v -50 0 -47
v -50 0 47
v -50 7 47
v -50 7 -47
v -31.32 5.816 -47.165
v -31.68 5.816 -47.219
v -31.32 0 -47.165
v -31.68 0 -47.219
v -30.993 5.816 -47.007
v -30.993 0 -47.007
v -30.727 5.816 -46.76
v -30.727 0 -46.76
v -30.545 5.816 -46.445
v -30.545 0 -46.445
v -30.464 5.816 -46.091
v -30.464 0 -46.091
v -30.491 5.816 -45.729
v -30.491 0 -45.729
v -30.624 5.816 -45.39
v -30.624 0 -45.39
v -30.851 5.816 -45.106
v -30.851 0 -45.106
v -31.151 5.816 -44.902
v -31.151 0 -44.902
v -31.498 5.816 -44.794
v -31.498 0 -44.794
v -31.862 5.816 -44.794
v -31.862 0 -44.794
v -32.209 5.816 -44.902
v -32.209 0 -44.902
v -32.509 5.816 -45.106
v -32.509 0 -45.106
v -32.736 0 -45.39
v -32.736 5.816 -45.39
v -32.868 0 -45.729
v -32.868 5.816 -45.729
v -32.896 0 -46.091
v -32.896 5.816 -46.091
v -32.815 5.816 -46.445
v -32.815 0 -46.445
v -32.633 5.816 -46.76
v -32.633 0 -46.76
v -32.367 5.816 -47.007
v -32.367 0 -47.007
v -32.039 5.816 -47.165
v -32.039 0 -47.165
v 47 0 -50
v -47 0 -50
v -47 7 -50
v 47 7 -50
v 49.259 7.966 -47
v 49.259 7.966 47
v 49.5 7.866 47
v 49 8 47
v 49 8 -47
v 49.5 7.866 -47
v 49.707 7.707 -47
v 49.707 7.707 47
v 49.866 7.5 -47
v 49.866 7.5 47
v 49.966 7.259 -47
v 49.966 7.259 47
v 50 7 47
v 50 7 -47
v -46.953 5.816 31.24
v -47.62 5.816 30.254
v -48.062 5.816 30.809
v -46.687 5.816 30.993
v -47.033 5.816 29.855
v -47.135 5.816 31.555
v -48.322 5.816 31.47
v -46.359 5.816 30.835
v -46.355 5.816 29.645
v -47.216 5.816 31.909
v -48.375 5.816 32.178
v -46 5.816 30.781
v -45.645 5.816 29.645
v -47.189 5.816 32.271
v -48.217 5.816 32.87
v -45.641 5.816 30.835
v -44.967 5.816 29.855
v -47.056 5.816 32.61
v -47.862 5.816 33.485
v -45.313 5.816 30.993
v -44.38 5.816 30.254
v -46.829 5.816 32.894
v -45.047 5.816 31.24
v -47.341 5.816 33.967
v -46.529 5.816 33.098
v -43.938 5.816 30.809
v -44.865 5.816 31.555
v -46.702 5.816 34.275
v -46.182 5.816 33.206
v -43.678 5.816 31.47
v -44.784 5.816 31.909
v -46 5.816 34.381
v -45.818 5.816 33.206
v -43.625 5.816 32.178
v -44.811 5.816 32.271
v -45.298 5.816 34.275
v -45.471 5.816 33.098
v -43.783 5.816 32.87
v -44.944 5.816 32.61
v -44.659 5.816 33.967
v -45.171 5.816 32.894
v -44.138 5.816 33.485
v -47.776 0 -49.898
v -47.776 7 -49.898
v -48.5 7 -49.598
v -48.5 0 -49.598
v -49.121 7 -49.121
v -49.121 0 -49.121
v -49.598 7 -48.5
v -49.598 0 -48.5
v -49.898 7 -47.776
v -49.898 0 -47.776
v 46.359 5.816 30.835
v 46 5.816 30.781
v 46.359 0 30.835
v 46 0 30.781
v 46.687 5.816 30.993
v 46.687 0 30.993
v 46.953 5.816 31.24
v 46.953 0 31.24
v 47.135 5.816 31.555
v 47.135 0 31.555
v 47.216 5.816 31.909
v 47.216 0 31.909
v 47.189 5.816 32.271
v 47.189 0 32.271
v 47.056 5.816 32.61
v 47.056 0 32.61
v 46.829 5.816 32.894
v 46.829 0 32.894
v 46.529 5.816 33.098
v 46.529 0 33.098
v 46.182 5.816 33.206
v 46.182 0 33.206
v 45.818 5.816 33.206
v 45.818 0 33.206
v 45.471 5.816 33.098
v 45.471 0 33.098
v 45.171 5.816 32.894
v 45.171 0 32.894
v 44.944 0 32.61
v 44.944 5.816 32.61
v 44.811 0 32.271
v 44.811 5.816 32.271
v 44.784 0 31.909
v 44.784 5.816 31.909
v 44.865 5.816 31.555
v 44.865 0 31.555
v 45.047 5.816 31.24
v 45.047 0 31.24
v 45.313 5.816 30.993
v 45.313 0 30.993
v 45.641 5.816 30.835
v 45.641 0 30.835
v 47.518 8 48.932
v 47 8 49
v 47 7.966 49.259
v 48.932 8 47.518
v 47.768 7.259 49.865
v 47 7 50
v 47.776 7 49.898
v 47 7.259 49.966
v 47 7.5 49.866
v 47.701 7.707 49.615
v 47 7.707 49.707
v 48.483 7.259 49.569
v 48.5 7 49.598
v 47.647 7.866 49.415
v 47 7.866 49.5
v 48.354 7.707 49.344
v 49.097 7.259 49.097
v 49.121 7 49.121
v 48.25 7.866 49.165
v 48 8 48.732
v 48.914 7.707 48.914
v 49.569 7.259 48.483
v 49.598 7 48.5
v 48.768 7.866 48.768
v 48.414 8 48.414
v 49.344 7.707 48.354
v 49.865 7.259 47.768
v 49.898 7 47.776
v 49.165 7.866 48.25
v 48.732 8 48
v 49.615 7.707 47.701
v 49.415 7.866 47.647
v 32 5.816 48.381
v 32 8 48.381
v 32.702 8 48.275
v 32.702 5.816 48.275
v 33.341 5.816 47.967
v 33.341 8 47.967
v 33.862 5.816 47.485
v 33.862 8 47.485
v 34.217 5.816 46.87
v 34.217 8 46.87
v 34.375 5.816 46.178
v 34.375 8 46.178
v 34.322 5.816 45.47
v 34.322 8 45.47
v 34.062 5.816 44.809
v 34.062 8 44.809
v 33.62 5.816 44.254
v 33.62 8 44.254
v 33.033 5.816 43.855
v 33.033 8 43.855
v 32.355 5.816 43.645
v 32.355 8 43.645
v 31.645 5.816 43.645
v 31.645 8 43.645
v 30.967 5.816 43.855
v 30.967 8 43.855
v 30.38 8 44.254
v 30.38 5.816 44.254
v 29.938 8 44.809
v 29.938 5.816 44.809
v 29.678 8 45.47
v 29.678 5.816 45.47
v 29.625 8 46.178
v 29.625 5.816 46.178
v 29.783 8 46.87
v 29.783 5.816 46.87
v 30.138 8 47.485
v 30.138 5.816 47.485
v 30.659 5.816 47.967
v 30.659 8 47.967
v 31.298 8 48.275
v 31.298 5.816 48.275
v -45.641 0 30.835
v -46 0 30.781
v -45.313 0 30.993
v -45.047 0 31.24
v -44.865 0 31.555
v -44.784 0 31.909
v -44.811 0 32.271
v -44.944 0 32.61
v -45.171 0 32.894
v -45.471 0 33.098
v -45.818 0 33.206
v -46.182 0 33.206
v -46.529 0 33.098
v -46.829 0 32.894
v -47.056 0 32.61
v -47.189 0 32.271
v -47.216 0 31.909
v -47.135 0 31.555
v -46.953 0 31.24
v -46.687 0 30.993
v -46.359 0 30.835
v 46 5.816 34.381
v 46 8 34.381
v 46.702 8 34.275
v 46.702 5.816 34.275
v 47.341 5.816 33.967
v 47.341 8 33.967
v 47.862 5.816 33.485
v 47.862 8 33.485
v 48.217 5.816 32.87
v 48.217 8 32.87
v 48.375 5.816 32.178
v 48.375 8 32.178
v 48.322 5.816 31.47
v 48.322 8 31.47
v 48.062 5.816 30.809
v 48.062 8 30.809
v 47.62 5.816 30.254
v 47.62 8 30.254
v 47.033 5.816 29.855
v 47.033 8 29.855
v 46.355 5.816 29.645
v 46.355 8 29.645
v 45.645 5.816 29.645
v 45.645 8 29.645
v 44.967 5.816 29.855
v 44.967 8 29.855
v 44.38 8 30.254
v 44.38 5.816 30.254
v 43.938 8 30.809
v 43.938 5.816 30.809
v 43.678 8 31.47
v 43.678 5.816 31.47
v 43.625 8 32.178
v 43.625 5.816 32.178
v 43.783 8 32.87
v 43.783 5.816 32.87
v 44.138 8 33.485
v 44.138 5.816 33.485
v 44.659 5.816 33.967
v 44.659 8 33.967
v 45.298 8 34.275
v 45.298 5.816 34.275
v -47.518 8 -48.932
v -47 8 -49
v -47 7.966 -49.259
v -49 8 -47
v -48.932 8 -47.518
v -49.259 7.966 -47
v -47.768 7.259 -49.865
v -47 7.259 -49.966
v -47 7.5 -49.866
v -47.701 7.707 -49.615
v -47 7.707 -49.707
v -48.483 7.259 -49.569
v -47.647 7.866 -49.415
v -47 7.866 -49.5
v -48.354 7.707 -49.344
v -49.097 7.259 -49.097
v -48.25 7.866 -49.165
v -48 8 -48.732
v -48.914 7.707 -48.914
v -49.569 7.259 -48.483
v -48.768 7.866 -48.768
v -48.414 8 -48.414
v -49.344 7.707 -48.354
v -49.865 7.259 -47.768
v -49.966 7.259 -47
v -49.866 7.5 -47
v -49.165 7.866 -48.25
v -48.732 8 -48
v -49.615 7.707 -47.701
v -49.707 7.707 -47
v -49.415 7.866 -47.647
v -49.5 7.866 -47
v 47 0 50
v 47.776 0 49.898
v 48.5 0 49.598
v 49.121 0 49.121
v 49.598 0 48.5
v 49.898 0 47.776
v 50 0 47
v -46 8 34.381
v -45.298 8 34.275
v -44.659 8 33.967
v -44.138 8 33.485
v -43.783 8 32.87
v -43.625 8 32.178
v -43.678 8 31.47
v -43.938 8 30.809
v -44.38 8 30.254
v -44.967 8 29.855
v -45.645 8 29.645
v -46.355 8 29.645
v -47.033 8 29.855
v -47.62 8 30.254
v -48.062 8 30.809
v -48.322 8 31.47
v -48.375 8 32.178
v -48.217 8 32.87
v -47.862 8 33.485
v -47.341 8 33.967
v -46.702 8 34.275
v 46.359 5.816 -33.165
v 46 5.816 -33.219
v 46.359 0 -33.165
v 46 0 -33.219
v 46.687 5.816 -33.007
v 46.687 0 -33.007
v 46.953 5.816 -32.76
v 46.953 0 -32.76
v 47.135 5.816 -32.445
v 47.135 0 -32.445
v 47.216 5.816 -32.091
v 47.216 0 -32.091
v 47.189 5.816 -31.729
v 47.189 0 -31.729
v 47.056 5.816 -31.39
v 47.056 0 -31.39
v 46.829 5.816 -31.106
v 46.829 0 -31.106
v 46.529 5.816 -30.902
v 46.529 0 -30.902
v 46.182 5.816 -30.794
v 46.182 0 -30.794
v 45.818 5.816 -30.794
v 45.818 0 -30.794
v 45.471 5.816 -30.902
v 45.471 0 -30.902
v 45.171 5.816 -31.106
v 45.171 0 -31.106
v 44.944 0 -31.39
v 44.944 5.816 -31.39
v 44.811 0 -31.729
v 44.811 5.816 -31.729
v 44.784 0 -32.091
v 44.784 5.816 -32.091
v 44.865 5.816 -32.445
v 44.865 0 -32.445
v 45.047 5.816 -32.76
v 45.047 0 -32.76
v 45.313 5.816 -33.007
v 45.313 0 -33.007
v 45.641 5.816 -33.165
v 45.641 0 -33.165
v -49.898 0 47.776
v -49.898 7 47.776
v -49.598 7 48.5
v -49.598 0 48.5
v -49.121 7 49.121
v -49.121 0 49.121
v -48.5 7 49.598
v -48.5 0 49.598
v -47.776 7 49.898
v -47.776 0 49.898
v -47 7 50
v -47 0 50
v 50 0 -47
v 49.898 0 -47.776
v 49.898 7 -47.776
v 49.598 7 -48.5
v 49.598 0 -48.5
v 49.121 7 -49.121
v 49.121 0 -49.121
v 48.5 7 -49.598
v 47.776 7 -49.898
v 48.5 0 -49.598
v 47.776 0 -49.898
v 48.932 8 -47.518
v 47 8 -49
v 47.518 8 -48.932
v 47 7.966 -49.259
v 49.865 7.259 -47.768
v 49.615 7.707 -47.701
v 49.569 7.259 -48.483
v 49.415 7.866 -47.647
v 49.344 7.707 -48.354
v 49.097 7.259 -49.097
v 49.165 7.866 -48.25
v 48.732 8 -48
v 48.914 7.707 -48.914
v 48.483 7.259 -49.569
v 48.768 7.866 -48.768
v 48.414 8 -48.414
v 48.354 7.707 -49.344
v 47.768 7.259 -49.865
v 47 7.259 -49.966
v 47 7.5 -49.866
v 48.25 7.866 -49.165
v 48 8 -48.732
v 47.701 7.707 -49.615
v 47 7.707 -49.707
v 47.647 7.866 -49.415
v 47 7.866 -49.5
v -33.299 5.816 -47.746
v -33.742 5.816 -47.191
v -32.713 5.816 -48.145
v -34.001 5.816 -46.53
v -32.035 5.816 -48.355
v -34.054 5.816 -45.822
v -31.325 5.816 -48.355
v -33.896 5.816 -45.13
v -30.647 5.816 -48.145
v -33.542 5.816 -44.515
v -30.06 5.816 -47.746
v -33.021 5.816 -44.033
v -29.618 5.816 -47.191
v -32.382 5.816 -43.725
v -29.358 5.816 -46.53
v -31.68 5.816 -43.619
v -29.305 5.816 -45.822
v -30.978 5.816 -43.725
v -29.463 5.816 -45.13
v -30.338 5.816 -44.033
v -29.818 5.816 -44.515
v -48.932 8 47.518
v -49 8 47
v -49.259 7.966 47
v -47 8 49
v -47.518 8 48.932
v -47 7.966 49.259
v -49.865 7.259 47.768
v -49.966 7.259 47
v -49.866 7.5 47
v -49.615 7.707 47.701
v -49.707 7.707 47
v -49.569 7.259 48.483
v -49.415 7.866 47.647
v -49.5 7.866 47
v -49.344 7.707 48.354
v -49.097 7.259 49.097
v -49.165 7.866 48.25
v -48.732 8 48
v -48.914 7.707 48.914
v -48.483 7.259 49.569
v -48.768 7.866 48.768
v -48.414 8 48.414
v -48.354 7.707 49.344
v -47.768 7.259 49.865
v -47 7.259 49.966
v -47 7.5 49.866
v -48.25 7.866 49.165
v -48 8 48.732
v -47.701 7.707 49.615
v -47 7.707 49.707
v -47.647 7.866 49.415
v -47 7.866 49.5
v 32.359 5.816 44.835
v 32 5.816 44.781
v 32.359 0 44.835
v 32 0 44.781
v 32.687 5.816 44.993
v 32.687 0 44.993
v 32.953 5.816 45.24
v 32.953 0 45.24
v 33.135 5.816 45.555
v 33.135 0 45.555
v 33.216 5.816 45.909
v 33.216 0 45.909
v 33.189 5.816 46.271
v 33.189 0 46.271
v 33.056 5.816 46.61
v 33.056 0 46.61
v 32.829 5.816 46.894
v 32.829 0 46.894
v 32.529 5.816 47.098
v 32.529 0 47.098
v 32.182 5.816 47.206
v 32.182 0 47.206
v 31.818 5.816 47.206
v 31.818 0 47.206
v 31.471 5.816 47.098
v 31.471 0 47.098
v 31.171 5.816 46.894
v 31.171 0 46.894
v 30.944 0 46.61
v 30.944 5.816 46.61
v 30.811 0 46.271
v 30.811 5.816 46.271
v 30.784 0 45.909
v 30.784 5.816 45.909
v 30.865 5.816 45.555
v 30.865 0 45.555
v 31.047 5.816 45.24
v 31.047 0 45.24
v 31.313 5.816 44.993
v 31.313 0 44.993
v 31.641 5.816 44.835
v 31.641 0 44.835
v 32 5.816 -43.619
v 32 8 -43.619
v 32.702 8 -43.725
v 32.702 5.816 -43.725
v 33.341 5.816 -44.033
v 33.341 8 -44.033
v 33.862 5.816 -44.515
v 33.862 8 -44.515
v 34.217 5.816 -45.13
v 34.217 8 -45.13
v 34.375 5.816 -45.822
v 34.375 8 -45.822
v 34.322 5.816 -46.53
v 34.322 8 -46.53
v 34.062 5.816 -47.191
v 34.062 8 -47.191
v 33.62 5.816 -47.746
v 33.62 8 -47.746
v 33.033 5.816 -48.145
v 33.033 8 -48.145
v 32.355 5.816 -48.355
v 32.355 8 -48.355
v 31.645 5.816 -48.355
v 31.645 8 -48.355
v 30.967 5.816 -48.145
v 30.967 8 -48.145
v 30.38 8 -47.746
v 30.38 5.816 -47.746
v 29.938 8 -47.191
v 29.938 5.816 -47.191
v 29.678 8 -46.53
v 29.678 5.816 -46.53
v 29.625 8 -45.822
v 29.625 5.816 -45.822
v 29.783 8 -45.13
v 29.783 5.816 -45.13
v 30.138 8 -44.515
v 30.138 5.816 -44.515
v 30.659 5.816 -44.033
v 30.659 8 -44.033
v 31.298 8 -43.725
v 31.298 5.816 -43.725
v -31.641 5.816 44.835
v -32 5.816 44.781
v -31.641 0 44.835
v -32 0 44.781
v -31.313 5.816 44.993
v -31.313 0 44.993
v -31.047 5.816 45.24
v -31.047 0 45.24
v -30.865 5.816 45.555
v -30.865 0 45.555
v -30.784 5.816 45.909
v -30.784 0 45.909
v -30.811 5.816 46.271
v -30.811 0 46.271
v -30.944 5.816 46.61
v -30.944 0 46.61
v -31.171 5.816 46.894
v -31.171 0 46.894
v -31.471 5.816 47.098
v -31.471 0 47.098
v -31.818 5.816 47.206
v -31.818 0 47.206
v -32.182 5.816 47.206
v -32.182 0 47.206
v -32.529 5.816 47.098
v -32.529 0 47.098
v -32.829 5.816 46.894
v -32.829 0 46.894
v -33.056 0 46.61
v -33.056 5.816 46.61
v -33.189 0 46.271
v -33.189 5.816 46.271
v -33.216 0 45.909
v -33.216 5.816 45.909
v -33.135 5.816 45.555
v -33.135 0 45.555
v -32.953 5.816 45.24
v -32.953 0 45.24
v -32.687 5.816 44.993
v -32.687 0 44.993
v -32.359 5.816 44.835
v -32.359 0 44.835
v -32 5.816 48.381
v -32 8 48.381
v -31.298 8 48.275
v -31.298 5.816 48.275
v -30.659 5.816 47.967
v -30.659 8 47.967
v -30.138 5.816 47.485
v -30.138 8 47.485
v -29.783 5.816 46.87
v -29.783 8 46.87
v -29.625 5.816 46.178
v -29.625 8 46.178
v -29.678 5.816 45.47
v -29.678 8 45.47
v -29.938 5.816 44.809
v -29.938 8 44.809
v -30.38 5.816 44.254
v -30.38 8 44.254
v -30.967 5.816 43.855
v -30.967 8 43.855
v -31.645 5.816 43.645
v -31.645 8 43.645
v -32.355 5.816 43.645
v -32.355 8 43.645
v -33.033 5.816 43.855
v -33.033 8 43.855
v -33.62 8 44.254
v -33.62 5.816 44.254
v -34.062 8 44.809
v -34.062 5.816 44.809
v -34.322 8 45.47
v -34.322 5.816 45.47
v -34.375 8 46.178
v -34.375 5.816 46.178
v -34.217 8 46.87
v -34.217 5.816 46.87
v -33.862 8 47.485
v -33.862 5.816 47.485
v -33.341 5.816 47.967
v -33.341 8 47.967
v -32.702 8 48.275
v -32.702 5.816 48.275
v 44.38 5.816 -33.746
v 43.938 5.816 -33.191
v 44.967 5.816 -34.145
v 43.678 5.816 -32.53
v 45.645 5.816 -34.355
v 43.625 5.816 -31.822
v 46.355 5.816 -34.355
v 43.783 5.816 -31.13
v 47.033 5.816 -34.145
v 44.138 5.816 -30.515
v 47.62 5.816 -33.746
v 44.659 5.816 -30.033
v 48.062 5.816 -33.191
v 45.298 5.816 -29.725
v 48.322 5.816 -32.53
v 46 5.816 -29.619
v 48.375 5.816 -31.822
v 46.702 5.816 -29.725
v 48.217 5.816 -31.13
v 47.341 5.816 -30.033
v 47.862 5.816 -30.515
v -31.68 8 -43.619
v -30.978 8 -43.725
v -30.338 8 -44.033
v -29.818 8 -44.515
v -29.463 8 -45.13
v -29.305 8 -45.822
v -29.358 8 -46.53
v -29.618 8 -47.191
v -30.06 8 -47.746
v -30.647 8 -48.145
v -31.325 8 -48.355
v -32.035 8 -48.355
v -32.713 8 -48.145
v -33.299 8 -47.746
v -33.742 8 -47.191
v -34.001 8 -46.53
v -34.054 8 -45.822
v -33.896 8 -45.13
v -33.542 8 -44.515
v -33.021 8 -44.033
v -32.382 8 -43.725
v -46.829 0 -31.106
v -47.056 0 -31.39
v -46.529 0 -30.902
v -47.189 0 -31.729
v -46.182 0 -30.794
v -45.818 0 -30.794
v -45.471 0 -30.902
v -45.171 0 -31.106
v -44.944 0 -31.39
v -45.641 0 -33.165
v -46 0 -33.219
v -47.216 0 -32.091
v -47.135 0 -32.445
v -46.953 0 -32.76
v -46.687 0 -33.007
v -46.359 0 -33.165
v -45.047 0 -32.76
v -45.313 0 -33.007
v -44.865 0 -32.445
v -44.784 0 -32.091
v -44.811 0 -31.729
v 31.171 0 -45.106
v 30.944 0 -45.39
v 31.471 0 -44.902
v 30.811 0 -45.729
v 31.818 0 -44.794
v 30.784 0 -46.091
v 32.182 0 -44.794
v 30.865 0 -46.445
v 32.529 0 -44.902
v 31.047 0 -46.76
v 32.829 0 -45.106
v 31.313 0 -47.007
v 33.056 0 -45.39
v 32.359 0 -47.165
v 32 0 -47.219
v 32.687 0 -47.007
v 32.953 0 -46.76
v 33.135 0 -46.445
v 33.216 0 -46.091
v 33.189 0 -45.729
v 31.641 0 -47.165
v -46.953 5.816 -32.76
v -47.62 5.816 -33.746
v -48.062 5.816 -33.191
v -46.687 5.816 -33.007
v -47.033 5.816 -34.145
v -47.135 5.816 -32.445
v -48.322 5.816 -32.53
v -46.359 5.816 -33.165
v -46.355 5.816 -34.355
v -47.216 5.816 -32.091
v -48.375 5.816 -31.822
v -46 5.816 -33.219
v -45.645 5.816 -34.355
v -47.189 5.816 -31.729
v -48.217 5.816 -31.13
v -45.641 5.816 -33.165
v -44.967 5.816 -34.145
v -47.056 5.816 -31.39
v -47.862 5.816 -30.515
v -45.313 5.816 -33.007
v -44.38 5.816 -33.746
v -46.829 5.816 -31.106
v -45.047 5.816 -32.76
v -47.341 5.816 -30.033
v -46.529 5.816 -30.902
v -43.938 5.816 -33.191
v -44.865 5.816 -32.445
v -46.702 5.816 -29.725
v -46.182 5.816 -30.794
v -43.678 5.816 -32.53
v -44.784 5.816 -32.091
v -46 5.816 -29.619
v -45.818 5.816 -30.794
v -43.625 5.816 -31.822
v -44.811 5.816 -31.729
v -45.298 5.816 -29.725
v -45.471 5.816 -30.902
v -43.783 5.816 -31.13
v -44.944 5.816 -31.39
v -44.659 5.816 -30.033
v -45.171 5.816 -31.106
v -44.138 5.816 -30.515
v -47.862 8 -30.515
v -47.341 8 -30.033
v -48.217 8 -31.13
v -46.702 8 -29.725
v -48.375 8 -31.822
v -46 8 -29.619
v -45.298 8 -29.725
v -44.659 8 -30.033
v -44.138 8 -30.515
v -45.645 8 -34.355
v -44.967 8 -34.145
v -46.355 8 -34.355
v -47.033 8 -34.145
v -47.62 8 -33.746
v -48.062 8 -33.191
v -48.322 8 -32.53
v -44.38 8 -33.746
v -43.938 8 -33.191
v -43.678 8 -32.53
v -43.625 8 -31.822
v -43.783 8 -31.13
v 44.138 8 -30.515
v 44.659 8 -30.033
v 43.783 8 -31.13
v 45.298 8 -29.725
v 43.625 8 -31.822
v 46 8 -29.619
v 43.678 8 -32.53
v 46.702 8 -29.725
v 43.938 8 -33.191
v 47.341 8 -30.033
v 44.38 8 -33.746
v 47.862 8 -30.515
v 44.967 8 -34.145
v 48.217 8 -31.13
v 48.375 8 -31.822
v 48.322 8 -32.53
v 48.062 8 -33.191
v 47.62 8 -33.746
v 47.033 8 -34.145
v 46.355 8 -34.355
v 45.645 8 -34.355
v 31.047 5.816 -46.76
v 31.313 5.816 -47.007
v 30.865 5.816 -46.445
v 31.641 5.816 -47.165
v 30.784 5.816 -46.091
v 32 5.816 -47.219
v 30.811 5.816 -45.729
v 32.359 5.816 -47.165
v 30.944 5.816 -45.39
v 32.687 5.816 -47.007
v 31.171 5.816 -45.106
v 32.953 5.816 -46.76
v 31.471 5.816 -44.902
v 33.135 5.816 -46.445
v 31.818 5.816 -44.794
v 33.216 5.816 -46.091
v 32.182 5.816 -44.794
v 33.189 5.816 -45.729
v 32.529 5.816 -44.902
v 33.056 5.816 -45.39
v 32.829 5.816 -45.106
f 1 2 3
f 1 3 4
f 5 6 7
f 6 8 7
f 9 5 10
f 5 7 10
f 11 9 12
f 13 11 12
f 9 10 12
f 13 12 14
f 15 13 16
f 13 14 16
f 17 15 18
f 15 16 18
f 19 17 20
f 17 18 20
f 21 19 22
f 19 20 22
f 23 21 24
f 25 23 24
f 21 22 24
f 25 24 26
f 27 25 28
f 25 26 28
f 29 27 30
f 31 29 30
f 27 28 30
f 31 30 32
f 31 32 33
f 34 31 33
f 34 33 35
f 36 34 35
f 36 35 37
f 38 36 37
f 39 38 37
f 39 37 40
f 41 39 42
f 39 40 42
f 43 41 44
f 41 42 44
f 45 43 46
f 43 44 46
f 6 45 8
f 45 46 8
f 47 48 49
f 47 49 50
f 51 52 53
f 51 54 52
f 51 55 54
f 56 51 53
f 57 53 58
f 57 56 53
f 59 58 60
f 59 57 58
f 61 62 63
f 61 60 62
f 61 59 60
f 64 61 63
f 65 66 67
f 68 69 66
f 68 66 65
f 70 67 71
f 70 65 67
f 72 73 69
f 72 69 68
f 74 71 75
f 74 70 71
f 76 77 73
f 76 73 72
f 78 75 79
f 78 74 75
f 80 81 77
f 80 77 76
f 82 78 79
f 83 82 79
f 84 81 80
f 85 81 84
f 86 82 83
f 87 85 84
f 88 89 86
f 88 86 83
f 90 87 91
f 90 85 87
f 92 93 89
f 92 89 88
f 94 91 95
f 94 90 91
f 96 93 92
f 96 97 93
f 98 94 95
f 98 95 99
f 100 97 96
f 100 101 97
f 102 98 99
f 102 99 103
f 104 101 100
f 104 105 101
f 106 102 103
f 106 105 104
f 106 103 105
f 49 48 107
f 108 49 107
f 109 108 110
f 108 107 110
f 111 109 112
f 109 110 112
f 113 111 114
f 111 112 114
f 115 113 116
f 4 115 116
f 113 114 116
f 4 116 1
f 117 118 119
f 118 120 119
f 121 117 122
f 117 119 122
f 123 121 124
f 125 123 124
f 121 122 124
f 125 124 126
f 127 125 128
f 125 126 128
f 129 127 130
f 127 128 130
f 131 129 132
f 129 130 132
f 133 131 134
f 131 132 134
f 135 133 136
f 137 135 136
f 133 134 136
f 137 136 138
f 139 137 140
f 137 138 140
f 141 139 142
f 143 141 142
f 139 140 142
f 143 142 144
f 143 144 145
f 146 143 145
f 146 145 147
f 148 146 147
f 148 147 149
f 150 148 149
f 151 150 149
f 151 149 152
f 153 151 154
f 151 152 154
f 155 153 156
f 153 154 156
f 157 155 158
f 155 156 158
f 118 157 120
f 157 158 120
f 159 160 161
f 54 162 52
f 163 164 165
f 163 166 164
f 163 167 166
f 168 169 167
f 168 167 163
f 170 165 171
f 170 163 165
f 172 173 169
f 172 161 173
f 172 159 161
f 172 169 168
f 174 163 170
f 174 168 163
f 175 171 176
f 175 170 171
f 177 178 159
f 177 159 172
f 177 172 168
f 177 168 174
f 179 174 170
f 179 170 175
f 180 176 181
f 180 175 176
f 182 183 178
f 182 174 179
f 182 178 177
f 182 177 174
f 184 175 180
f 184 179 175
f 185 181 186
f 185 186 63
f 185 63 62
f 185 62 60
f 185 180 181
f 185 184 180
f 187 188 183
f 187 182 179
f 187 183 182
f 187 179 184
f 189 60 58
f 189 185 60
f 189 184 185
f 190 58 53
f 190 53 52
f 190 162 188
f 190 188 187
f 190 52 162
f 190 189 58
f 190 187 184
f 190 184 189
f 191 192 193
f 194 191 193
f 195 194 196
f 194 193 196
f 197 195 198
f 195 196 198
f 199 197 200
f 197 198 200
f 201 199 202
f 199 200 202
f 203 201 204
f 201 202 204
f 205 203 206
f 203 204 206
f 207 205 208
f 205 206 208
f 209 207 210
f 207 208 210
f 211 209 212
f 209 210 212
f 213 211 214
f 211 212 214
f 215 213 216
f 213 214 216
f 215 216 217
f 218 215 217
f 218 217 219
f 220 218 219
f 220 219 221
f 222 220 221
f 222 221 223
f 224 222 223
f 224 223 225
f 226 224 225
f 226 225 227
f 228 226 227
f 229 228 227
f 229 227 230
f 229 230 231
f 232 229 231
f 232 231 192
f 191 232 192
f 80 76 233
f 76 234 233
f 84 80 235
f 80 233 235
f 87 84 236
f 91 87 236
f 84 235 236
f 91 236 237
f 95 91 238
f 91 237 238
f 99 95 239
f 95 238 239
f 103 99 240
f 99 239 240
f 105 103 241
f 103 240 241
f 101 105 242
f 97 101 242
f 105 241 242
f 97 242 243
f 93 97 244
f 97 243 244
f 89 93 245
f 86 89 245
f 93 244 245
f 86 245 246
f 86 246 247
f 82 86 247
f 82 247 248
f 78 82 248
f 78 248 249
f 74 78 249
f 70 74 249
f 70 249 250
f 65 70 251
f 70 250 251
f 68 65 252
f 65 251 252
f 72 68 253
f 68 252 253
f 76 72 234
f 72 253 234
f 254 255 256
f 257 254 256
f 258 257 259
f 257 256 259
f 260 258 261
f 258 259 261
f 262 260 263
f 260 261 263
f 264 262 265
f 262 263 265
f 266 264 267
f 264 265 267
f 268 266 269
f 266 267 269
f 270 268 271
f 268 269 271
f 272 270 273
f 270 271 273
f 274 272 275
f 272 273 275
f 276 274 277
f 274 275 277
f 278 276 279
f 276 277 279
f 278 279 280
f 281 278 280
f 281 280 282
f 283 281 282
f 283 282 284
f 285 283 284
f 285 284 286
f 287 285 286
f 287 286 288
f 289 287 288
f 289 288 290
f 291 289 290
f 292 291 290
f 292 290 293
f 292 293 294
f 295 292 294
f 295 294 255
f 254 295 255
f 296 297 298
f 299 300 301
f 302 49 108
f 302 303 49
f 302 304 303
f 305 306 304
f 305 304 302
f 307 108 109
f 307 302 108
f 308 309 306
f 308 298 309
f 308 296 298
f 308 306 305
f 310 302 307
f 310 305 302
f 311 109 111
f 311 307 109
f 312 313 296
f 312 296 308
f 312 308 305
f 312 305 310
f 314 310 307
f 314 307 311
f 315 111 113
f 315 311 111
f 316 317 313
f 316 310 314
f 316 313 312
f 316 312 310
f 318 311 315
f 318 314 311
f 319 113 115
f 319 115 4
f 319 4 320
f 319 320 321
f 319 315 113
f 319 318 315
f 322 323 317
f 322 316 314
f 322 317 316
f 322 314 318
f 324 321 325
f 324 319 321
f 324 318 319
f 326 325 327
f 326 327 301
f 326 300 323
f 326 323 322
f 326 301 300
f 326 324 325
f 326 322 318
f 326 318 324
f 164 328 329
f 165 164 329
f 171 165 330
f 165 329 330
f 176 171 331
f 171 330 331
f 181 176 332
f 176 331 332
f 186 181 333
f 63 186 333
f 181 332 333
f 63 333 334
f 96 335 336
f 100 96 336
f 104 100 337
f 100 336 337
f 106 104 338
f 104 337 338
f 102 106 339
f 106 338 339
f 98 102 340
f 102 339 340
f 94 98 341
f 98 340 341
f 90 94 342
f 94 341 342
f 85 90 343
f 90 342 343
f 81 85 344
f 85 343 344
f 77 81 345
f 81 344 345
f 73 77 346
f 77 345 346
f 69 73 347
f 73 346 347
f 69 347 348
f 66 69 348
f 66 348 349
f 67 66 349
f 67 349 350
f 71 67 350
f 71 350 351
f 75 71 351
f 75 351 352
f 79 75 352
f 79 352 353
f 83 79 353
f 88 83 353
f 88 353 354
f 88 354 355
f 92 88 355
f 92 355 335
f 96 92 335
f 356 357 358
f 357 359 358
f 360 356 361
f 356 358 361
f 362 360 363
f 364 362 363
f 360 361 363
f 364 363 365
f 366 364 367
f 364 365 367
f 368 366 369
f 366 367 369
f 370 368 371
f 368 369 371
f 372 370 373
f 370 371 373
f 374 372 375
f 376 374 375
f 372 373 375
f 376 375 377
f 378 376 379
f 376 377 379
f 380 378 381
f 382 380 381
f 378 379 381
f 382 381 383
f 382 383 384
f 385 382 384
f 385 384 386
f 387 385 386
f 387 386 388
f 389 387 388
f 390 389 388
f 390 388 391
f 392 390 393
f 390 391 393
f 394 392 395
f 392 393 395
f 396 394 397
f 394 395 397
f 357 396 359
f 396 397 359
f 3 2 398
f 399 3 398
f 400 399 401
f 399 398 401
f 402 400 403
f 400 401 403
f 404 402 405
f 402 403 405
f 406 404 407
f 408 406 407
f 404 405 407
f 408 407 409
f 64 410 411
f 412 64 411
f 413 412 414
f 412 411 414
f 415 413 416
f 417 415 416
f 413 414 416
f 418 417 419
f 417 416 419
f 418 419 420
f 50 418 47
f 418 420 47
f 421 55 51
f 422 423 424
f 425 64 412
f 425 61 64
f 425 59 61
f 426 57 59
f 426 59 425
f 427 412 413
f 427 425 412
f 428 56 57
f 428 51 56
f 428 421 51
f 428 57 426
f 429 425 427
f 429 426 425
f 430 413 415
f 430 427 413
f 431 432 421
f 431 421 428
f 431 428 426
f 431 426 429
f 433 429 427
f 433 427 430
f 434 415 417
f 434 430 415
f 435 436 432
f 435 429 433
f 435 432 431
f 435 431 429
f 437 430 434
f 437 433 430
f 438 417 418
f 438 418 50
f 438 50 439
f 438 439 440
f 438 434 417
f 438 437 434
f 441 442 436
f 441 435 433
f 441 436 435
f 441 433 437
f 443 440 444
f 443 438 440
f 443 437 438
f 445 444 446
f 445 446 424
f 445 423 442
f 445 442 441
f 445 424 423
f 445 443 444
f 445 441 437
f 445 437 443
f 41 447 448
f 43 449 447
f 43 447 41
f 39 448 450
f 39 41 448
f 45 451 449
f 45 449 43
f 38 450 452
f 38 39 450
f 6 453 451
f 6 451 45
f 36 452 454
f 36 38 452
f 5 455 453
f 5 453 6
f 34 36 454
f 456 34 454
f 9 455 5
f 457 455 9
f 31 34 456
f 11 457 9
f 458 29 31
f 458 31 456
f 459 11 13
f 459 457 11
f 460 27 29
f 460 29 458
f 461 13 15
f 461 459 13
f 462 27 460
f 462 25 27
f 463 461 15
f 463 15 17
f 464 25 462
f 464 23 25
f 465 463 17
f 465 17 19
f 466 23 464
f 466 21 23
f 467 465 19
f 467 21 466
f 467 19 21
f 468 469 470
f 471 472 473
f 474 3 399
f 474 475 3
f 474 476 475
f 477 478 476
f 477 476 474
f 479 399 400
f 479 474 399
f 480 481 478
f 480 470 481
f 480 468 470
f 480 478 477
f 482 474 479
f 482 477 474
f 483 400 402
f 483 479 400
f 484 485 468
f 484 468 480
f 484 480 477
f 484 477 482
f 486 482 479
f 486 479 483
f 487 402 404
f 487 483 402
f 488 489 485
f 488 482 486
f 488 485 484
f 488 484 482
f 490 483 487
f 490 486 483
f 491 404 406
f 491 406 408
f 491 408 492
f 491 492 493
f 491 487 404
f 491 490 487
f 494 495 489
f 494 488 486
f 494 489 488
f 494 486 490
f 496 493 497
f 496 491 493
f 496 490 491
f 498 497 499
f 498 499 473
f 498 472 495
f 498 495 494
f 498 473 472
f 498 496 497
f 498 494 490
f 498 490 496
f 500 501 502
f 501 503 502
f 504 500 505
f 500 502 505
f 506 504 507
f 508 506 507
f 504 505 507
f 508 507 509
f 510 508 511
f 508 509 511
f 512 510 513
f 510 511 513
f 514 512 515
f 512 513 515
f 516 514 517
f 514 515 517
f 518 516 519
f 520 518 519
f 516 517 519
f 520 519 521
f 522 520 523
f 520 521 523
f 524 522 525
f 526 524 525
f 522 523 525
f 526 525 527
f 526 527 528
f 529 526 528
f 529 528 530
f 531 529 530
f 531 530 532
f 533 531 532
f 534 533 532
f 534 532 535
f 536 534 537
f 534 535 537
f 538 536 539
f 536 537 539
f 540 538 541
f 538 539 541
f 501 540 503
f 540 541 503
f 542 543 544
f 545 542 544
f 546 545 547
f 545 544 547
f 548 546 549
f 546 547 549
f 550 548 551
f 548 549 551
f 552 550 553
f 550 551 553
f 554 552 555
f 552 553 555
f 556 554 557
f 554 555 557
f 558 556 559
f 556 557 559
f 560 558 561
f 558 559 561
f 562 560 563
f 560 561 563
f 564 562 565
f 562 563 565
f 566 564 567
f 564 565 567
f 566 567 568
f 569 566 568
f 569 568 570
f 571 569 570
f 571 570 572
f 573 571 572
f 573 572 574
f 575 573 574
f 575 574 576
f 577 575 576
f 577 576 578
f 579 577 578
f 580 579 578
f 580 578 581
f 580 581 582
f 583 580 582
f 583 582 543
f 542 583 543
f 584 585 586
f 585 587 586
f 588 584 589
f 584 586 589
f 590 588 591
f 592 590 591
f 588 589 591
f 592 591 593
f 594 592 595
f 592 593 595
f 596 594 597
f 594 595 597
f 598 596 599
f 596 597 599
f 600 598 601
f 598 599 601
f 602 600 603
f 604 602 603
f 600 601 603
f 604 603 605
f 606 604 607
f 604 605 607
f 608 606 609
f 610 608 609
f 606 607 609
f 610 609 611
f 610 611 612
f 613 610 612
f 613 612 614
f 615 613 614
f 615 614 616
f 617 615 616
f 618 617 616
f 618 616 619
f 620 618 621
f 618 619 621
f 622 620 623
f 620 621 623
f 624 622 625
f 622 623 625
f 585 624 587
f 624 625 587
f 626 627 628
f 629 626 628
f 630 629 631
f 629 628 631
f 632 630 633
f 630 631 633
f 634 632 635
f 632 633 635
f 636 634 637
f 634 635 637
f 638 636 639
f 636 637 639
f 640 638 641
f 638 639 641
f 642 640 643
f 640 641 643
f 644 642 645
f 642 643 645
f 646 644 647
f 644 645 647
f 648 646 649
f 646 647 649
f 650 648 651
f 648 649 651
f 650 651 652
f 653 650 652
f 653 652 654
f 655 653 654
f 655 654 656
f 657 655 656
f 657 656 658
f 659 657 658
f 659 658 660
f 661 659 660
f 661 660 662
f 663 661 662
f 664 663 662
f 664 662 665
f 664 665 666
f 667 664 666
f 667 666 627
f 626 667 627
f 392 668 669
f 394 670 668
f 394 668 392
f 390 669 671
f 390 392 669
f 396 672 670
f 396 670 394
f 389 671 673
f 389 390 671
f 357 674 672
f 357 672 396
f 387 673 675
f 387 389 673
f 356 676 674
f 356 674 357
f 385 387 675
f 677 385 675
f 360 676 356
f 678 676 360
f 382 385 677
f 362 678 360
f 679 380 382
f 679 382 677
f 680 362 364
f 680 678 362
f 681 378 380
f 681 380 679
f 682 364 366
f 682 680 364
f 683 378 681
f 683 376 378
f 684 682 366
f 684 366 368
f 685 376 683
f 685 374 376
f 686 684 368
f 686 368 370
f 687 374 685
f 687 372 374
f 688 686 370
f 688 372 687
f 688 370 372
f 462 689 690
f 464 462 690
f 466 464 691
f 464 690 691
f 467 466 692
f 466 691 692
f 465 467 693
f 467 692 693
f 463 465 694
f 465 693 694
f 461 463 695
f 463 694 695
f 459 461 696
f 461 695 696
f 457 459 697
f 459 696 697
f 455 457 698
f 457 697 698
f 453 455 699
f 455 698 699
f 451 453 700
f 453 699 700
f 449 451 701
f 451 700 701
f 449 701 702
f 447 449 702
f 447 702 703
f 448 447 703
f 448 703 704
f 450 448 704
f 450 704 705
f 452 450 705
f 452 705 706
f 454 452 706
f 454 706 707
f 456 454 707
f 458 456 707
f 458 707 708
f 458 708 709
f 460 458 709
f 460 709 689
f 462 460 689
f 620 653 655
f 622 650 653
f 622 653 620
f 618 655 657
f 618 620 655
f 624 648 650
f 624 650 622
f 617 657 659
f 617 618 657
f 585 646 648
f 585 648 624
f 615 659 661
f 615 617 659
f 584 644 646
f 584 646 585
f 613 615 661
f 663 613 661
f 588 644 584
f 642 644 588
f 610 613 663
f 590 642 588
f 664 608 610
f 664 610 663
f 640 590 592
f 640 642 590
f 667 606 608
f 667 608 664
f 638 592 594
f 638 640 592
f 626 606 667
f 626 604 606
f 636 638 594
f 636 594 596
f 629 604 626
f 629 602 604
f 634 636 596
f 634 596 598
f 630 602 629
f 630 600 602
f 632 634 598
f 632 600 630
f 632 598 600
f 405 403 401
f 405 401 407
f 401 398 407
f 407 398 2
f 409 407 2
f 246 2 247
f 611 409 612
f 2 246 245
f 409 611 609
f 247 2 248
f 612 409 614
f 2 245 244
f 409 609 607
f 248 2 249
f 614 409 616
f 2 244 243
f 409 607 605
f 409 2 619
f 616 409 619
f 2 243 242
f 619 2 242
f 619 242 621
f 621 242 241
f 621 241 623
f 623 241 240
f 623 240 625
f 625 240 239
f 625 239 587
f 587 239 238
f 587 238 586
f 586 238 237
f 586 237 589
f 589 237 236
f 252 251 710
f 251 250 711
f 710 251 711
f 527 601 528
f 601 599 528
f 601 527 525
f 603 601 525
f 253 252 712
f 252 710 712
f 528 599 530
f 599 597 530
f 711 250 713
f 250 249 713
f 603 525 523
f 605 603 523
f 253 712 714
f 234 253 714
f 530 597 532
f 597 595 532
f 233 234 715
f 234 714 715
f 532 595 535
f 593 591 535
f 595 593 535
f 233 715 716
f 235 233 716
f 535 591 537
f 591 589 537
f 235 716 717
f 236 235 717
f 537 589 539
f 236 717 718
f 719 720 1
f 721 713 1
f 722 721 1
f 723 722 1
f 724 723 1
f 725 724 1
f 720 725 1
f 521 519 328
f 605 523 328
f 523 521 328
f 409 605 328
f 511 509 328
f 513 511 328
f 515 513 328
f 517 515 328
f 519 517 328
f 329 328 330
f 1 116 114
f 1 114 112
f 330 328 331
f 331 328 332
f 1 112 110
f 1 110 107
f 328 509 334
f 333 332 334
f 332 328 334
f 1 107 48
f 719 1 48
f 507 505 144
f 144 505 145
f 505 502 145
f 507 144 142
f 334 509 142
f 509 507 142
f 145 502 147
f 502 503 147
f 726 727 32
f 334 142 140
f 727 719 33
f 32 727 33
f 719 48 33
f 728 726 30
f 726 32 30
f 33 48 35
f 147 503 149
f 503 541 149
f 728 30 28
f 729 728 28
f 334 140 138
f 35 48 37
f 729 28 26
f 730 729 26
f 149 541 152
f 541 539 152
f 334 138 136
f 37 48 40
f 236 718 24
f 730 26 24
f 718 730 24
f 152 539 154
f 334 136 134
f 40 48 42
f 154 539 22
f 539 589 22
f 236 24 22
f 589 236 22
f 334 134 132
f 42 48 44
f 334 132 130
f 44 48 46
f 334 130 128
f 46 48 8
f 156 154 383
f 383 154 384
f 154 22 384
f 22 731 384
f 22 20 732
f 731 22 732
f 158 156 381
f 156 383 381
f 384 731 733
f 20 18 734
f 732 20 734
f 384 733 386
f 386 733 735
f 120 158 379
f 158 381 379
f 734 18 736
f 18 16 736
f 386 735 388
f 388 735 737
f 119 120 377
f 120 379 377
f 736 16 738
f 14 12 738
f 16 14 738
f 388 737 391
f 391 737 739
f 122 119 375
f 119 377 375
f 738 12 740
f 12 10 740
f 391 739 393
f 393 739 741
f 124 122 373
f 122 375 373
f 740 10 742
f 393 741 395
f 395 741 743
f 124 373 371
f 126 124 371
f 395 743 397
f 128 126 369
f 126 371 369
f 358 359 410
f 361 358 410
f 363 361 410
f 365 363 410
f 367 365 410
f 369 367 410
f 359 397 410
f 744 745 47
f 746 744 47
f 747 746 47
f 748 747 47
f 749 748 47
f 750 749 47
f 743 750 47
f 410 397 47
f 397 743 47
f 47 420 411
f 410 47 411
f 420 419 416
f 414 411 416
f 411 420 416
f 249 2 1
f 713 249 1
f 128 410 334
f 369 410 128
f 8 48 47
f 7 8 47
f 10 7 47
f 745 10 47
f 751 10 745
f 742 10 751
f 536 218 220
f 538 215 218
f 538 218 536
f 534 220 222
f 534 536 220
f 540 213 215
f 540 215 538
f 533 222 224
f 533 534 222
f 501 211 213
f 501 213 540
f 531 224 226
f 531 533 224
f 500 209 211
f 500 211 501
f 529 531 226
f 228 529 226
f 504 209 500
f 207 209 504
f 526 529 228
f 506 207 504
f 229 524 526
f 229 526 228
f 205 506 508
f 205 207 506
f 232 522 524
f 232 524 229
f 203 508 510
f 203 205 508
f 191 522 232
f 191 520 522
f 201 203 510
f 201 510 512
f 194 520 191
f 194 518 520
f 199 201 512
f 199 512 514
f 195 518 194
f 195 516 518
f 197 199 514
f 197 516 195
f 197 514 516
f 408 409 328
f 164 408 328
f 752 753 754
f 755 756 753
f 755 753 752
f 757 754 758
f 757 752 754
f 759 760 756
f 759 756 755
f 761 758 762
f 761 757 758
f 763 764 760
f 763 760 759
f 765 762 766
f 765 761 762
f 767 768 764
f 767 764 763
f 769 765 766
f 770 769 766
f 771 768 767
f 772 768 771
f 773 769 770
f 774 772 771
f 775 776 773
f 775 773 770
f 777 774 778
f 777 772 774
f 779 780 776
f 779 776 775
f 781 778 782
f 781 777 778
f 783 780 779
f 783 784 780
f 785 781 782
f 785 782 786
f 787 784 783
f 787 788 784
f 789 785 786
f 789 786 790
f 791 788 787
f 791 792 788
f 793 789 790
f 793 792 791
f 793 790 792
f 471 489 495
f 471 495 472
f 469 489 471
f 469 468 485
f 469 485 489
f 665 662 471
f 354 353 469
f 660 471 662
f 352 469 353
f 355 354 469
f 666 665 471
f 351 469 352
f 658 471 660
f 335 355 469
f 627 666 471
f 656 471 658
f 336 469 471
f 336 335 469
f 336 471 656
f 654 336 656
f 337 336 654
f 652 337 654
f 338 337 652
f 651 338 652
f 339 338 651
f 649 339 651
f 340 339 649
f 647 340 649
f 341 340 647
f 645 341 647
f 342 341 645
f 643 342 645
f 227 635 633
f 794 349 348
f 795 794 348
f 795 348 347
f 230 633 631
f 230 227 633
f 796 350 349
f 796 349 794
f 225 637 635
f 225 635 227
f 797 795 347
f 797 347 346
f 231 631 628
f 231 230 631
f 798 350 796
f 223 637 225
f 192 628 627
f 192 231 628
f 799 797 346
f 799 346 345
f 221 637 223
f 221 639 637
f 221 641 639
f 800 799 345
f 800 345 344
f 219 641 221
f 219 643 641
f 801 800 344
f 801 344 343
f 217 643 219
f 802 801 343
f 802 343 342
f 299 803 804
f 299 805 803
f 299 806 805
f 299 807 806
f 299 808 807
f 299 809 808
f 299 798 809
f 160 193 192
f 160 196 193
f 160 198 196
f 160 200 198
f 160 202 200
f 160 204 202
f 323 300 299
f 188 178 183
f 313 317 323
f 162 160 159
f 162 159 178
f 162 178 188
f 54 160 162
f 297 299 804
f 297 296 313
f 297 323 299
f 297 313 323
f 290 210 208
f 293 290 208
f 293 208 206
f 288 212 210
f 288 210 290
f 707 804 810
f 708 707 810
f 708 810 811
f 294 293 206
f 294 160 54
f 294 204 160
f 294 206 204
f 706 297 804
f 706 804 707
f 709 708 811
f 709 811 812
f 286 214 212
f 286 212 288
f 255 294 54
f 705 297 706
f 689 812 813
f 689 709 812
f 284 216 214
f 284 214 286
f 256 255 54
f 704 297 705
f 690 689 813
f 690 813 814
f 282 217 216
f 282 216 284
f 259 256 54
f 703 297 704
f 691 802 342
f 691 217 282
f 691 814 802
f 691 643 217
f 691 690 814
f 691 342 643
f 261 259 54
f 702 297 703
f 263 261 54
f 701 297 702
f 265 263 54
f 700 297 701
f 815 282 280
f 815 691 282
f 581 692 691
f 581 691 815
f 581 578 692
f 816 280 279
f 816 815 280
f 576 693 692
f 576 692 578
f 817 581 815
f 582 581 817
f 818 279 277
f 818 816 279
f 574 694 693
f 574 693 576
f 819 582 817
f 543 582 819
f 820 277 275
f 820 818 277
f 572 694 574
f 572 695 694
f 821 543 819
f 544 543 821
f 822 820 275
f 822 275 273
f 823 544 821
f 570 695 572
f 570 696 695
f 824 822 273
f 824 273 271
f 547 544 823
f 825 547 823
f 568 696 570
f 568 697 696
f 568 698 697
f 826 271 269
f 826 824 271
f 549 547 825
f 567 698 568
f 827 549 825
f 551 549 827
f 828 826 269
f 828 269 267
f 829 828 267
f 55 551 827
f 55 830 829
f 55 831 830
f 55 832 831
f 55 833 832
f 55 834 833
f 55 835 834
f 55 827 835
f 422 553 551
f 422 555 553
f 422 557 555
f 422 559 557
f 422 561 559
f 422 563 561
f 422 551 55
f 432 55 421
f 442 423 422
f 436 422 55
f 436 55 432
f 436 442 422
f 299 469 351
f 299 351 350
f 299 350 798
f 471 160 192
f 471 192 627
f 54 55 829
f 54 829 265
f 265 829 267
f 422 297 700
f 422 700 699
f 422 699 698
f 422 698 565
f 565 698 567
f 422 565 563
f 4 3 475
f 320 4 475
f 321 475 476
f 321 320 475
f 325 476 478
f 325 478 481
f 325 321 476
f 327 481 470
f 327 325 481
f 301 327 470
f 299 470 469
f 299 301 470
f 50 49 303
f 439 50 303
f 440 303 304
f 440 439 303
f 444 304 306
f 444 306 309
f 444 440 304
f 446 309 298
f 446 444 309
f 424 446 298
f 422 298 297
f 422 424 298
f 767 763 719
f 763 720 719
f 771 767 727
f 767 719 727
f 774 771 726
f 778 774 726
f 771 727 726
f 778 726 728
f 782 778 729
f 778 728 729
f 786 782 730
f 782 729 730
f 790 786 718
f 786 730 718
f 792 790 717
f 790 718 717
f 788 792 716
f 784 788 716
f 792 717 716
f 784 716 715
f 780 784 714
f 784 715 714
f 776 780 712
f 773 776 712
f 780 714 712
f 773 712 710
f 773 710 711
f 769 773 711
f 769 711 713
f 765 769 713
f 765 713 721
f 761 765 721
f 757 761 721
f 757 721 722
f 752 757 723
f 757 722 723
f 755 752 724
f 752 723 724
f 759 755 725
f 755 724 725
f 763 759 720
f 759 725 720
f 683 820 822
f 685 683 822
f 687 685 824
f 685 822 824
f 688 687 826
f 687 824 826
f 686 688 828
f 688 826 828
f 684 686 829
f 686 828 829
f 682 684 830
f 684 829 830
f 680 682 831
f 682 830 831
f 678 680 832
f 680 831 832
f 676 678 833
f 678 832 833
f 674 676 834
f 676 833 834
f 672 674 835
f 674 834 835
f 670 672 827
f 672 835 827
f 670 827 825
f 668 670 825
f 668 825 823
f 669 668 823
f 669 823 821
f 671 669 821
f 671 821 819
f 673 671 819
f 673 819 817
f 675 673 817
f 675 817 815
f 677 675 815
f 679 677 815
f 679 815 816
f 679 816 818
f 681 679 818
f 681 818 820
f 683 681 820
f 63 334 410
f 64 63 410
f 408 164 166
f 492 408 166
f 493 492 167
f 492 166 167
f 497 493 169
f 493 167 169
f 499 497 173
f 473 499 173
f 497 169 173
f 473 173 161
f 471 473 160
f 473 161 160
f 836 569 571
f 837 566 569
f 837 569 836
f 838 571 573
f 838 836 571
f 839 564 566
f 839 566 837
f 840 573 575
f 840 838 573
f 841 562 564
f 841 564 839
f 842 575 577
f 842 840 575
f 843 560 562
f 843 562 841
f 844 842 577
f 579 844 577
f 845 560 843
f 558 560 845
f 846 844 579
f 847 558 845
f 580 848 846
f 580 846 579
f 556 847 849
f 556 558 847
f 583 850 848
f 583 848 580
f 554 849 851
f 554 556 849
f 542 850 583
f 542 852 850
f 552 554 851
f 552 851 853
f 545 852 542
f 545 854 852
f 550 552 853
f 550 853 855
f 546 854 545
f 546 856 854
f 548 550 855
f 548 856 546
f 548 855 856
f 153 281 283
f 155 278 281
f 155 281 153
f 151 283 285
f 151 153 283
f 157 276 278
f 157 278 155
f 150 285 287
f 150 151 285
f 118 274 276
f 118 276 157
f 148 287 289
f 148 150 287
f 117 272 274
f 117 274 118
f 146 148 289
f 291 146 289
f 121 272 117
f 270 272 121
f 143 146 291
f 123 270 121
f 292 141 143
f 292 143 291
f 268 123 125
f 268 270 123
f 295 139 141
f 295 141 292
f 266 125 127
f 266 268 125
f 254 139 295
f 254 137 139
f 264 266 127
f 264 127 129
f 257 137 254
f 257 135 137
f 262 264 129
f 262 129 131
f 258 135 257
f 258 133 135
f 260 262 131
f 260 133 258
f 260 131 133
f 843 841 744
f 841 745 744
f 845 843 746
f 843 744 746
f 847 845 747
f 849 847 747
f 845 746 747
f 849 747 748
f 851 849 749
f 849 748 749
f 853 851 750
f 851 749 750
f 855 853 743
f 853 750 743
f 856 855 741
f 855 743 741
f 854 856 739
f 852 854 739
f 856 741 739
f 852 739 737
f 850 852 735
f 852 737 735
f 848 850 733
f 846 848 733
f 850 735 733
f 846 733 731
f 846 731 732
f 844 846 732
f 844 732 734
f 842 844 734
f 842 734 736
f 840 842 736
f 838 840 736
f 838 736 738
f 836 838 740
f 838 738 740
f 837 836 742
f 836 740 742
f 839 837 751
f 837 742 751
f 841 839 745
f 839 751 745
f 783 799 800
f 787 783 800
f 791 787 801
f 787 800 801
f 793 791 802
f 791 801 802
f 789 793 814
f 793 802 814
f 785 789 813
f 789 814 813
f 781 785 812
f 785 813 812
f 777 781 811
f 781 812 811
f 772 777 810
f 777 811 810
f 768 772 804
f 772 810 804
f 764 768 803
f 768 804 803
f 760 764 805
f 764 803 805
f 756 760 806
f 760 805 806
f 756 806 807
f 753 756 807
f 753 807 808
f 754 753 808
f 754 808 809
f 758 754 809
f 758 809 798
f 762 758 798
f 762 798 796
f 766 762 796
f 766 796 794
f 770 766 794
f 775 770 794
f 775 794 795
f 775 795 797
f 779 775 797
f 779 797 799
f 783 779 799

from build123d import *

# Parameters (mm, degrees)
SKETCH3_W                                      = 100
SKETCH3_H                                      = 100
BOSS_EXTRUDE2_DEPTH                            = 8
CBORE_FOR_2_SOCKET_HEAD_CAP_SCREW1_D           = 2.4384
CBORE_FOR_2_SOCKET_HEAD_CAP_SCREW1_CBORE_D     = 4.7625
CBORE_FOR_2_SOCKET_HEAD_CAP_SCREW1_CBORE_DEPTH = 2.1844
FILLET1_R                                      = 1
FILLET2_R                                      = 3
FILLET3_R                                      = 3


with BuildPart() as part:
    # Sketch3 → Boss-Extrude2 (new body)
    with BuildSketch(Plane(origin=(0, 0, 0), x_dir=(1, 0, 0), z_dir=(0, 1, 0))):
        Rectangle(SKETCH3_W, SKETCH3_H)
    extrude(amount=BOSS_EXTRUDE2_DEPTH)

    # CBORE for #2 Socket Head Cap Screw1 (through all)
    with Locations(Plane(origin=(-46, 8, 32), x_dir=(0, 0, 1), z_dir=(0, 1, 0))):
        with Locations((0, 0), (14, 14), (-64, 0), (-78, 14.320192801), (-78, 78), (-64, 92), (14, 78), (0, 92)):
            CounterBoreHole(CBORE_FOR_2_SOCKET_HEAD_CAP_SCREW1_D / 2, CBORE_FOR_2_SOCKET_HEAD_CAP_SCREW1_CBORE_D / 2, CBORE_FOR_2_SOCKET_HEAD_CAP_SCREW1_CBORE_DEPTH)

    # Fillet1
    fillet1_edges = [part.edges().sort_by_distance(p)[0] for p in [
        (-50, 8, 0),
        (0, 8, 50),
        (50, 8, 0),
        (0, 8, -50),
    ]]
    fillet(fillet1_edges, radius=FILLET1_R)

    # Fillet2
    # the kernel refuses this fillet: 3 mm, written as the material it takes off along each edge
    with BuildSketch(Plane(origin=(-47, 8, -47), x_dir=(0, 0, -1), z_dir=(1, 0, 0))) as fillet2_piece_1:
        with BuildLine():
            CenterArc((2, -1), 1, 0, 90)
            Line((3, -1), (3, 0))
            Line((3, 0), (2, 0))
        make_face()
    revolve(axis=Axis((-47, 8, -47), (0, 1, 0)), revolution_arc=90, mode=Mode.SUBTRACT)
    with BuildSketch(Plane(origin=(47, 8, -47), x_dir=(1, 0, 0), z_dir=(0, 0, 1))) as fillet2_piece_2:
        with BuildLine():
            CenterArc((2, -1), 1, 0, 90)
            Line((3, -1), (3, 0))
            Line((3, 0), (2, 0))
        make_face()
    revolve(axis=Axis((47, 8, -47), (0, 1, 0)), revolution_arc=90, mode=Mode.SUBTRACT)
    with BuildSketch(Plane(origin=(-47, 8, 47), x_dir=(-1, 0, 0), z_dir=(0, 0, -1))) as fillet2_piece_3:
        with BuildLine():
            CenterArc((2, -1), 1, 0, 90)
            Line((3, -1), (3, 0))
            Line((3, 0), (2, 0))
        make_face()
    revolve(axis=Axis((-47, 8, 47), (0, 1, 0)), revolution_arc=90, mode=Mode.SUBTRACT)
    with BuildSketch(Plane(origin=(-50, -7.5, 50), x_dir=(0, 0, -1), z_dir=(0, 1, 0)), Plane(origin=(-50, -7.5, -50), x_dir=(1, 0, 0), z_dir=(0, 1, 0))) as fillet2_piece_4:
        with BuildLine():
            CenterArc((FILLET2_R, -FILLET2_R), FILLET2_R, 90, 90)
            Line((0, -FILLET2_R), (0, 0))
            Line((0, 0), (FILLET2_R, 0))
        make_face()
    extrude(amount=15.5, mode=Mode.SUBTRACT)
    with BuildSketch(Plane(origin=(50, -7.5, -50), x_dir=(-1, 0, 0), z_dir=(0, 1, 0))) as fillet2_piece_5:
        with BuildLine():
            CenterArc((FILLET2_R, FILLET2_R), FILLET2_R, 180, 90)
            Line((0, FILLET2_R), (0, 0))
            Line((0, 0), (FILLET2_R, 0))
        make_face()
    extrude(amount=15.5, mode=Mode.SUBTRACT)

    # Fillet3
    # the kernel refuses this fillet: 3 mm, written as the material it takes off along each edge
    with BuildSketch(Plane(origin=(47, 8, 47), x_dir=(0, 0, 1), z_dir=(-1, 0, 0))) as fillet3_piece_1:
        with BuildLine():
            CenterArc((2, -1), 1, 0, 90)
            Line((3, -1), (3, 0))
            Line((3, 0), (2, 0))
        make_face()
    revolve(axis=Axis((47, 8, 47), (0, 1, 0)), revolution_arc=90, mode=Mode.SUBTRACT)
    with BuildSketch(Plane(origin=(50, -7.5, 50), x_dir=(-1, 0, 0), z_dir=(0, 1, 0))) as fillet3_piece_2:
        with BuildLine():
            CenterArc((FILLET3_R, -FILLET3_R), FILLET3_R, 90, 90)
            Line((0, -FILLET3_R), (0, 0))
            Line((0, 0), (FILLET3_R, 0))
        make_face()
    extrude(amount=15.5, mode=Mode.SUBTRACT)


solid = part.part
